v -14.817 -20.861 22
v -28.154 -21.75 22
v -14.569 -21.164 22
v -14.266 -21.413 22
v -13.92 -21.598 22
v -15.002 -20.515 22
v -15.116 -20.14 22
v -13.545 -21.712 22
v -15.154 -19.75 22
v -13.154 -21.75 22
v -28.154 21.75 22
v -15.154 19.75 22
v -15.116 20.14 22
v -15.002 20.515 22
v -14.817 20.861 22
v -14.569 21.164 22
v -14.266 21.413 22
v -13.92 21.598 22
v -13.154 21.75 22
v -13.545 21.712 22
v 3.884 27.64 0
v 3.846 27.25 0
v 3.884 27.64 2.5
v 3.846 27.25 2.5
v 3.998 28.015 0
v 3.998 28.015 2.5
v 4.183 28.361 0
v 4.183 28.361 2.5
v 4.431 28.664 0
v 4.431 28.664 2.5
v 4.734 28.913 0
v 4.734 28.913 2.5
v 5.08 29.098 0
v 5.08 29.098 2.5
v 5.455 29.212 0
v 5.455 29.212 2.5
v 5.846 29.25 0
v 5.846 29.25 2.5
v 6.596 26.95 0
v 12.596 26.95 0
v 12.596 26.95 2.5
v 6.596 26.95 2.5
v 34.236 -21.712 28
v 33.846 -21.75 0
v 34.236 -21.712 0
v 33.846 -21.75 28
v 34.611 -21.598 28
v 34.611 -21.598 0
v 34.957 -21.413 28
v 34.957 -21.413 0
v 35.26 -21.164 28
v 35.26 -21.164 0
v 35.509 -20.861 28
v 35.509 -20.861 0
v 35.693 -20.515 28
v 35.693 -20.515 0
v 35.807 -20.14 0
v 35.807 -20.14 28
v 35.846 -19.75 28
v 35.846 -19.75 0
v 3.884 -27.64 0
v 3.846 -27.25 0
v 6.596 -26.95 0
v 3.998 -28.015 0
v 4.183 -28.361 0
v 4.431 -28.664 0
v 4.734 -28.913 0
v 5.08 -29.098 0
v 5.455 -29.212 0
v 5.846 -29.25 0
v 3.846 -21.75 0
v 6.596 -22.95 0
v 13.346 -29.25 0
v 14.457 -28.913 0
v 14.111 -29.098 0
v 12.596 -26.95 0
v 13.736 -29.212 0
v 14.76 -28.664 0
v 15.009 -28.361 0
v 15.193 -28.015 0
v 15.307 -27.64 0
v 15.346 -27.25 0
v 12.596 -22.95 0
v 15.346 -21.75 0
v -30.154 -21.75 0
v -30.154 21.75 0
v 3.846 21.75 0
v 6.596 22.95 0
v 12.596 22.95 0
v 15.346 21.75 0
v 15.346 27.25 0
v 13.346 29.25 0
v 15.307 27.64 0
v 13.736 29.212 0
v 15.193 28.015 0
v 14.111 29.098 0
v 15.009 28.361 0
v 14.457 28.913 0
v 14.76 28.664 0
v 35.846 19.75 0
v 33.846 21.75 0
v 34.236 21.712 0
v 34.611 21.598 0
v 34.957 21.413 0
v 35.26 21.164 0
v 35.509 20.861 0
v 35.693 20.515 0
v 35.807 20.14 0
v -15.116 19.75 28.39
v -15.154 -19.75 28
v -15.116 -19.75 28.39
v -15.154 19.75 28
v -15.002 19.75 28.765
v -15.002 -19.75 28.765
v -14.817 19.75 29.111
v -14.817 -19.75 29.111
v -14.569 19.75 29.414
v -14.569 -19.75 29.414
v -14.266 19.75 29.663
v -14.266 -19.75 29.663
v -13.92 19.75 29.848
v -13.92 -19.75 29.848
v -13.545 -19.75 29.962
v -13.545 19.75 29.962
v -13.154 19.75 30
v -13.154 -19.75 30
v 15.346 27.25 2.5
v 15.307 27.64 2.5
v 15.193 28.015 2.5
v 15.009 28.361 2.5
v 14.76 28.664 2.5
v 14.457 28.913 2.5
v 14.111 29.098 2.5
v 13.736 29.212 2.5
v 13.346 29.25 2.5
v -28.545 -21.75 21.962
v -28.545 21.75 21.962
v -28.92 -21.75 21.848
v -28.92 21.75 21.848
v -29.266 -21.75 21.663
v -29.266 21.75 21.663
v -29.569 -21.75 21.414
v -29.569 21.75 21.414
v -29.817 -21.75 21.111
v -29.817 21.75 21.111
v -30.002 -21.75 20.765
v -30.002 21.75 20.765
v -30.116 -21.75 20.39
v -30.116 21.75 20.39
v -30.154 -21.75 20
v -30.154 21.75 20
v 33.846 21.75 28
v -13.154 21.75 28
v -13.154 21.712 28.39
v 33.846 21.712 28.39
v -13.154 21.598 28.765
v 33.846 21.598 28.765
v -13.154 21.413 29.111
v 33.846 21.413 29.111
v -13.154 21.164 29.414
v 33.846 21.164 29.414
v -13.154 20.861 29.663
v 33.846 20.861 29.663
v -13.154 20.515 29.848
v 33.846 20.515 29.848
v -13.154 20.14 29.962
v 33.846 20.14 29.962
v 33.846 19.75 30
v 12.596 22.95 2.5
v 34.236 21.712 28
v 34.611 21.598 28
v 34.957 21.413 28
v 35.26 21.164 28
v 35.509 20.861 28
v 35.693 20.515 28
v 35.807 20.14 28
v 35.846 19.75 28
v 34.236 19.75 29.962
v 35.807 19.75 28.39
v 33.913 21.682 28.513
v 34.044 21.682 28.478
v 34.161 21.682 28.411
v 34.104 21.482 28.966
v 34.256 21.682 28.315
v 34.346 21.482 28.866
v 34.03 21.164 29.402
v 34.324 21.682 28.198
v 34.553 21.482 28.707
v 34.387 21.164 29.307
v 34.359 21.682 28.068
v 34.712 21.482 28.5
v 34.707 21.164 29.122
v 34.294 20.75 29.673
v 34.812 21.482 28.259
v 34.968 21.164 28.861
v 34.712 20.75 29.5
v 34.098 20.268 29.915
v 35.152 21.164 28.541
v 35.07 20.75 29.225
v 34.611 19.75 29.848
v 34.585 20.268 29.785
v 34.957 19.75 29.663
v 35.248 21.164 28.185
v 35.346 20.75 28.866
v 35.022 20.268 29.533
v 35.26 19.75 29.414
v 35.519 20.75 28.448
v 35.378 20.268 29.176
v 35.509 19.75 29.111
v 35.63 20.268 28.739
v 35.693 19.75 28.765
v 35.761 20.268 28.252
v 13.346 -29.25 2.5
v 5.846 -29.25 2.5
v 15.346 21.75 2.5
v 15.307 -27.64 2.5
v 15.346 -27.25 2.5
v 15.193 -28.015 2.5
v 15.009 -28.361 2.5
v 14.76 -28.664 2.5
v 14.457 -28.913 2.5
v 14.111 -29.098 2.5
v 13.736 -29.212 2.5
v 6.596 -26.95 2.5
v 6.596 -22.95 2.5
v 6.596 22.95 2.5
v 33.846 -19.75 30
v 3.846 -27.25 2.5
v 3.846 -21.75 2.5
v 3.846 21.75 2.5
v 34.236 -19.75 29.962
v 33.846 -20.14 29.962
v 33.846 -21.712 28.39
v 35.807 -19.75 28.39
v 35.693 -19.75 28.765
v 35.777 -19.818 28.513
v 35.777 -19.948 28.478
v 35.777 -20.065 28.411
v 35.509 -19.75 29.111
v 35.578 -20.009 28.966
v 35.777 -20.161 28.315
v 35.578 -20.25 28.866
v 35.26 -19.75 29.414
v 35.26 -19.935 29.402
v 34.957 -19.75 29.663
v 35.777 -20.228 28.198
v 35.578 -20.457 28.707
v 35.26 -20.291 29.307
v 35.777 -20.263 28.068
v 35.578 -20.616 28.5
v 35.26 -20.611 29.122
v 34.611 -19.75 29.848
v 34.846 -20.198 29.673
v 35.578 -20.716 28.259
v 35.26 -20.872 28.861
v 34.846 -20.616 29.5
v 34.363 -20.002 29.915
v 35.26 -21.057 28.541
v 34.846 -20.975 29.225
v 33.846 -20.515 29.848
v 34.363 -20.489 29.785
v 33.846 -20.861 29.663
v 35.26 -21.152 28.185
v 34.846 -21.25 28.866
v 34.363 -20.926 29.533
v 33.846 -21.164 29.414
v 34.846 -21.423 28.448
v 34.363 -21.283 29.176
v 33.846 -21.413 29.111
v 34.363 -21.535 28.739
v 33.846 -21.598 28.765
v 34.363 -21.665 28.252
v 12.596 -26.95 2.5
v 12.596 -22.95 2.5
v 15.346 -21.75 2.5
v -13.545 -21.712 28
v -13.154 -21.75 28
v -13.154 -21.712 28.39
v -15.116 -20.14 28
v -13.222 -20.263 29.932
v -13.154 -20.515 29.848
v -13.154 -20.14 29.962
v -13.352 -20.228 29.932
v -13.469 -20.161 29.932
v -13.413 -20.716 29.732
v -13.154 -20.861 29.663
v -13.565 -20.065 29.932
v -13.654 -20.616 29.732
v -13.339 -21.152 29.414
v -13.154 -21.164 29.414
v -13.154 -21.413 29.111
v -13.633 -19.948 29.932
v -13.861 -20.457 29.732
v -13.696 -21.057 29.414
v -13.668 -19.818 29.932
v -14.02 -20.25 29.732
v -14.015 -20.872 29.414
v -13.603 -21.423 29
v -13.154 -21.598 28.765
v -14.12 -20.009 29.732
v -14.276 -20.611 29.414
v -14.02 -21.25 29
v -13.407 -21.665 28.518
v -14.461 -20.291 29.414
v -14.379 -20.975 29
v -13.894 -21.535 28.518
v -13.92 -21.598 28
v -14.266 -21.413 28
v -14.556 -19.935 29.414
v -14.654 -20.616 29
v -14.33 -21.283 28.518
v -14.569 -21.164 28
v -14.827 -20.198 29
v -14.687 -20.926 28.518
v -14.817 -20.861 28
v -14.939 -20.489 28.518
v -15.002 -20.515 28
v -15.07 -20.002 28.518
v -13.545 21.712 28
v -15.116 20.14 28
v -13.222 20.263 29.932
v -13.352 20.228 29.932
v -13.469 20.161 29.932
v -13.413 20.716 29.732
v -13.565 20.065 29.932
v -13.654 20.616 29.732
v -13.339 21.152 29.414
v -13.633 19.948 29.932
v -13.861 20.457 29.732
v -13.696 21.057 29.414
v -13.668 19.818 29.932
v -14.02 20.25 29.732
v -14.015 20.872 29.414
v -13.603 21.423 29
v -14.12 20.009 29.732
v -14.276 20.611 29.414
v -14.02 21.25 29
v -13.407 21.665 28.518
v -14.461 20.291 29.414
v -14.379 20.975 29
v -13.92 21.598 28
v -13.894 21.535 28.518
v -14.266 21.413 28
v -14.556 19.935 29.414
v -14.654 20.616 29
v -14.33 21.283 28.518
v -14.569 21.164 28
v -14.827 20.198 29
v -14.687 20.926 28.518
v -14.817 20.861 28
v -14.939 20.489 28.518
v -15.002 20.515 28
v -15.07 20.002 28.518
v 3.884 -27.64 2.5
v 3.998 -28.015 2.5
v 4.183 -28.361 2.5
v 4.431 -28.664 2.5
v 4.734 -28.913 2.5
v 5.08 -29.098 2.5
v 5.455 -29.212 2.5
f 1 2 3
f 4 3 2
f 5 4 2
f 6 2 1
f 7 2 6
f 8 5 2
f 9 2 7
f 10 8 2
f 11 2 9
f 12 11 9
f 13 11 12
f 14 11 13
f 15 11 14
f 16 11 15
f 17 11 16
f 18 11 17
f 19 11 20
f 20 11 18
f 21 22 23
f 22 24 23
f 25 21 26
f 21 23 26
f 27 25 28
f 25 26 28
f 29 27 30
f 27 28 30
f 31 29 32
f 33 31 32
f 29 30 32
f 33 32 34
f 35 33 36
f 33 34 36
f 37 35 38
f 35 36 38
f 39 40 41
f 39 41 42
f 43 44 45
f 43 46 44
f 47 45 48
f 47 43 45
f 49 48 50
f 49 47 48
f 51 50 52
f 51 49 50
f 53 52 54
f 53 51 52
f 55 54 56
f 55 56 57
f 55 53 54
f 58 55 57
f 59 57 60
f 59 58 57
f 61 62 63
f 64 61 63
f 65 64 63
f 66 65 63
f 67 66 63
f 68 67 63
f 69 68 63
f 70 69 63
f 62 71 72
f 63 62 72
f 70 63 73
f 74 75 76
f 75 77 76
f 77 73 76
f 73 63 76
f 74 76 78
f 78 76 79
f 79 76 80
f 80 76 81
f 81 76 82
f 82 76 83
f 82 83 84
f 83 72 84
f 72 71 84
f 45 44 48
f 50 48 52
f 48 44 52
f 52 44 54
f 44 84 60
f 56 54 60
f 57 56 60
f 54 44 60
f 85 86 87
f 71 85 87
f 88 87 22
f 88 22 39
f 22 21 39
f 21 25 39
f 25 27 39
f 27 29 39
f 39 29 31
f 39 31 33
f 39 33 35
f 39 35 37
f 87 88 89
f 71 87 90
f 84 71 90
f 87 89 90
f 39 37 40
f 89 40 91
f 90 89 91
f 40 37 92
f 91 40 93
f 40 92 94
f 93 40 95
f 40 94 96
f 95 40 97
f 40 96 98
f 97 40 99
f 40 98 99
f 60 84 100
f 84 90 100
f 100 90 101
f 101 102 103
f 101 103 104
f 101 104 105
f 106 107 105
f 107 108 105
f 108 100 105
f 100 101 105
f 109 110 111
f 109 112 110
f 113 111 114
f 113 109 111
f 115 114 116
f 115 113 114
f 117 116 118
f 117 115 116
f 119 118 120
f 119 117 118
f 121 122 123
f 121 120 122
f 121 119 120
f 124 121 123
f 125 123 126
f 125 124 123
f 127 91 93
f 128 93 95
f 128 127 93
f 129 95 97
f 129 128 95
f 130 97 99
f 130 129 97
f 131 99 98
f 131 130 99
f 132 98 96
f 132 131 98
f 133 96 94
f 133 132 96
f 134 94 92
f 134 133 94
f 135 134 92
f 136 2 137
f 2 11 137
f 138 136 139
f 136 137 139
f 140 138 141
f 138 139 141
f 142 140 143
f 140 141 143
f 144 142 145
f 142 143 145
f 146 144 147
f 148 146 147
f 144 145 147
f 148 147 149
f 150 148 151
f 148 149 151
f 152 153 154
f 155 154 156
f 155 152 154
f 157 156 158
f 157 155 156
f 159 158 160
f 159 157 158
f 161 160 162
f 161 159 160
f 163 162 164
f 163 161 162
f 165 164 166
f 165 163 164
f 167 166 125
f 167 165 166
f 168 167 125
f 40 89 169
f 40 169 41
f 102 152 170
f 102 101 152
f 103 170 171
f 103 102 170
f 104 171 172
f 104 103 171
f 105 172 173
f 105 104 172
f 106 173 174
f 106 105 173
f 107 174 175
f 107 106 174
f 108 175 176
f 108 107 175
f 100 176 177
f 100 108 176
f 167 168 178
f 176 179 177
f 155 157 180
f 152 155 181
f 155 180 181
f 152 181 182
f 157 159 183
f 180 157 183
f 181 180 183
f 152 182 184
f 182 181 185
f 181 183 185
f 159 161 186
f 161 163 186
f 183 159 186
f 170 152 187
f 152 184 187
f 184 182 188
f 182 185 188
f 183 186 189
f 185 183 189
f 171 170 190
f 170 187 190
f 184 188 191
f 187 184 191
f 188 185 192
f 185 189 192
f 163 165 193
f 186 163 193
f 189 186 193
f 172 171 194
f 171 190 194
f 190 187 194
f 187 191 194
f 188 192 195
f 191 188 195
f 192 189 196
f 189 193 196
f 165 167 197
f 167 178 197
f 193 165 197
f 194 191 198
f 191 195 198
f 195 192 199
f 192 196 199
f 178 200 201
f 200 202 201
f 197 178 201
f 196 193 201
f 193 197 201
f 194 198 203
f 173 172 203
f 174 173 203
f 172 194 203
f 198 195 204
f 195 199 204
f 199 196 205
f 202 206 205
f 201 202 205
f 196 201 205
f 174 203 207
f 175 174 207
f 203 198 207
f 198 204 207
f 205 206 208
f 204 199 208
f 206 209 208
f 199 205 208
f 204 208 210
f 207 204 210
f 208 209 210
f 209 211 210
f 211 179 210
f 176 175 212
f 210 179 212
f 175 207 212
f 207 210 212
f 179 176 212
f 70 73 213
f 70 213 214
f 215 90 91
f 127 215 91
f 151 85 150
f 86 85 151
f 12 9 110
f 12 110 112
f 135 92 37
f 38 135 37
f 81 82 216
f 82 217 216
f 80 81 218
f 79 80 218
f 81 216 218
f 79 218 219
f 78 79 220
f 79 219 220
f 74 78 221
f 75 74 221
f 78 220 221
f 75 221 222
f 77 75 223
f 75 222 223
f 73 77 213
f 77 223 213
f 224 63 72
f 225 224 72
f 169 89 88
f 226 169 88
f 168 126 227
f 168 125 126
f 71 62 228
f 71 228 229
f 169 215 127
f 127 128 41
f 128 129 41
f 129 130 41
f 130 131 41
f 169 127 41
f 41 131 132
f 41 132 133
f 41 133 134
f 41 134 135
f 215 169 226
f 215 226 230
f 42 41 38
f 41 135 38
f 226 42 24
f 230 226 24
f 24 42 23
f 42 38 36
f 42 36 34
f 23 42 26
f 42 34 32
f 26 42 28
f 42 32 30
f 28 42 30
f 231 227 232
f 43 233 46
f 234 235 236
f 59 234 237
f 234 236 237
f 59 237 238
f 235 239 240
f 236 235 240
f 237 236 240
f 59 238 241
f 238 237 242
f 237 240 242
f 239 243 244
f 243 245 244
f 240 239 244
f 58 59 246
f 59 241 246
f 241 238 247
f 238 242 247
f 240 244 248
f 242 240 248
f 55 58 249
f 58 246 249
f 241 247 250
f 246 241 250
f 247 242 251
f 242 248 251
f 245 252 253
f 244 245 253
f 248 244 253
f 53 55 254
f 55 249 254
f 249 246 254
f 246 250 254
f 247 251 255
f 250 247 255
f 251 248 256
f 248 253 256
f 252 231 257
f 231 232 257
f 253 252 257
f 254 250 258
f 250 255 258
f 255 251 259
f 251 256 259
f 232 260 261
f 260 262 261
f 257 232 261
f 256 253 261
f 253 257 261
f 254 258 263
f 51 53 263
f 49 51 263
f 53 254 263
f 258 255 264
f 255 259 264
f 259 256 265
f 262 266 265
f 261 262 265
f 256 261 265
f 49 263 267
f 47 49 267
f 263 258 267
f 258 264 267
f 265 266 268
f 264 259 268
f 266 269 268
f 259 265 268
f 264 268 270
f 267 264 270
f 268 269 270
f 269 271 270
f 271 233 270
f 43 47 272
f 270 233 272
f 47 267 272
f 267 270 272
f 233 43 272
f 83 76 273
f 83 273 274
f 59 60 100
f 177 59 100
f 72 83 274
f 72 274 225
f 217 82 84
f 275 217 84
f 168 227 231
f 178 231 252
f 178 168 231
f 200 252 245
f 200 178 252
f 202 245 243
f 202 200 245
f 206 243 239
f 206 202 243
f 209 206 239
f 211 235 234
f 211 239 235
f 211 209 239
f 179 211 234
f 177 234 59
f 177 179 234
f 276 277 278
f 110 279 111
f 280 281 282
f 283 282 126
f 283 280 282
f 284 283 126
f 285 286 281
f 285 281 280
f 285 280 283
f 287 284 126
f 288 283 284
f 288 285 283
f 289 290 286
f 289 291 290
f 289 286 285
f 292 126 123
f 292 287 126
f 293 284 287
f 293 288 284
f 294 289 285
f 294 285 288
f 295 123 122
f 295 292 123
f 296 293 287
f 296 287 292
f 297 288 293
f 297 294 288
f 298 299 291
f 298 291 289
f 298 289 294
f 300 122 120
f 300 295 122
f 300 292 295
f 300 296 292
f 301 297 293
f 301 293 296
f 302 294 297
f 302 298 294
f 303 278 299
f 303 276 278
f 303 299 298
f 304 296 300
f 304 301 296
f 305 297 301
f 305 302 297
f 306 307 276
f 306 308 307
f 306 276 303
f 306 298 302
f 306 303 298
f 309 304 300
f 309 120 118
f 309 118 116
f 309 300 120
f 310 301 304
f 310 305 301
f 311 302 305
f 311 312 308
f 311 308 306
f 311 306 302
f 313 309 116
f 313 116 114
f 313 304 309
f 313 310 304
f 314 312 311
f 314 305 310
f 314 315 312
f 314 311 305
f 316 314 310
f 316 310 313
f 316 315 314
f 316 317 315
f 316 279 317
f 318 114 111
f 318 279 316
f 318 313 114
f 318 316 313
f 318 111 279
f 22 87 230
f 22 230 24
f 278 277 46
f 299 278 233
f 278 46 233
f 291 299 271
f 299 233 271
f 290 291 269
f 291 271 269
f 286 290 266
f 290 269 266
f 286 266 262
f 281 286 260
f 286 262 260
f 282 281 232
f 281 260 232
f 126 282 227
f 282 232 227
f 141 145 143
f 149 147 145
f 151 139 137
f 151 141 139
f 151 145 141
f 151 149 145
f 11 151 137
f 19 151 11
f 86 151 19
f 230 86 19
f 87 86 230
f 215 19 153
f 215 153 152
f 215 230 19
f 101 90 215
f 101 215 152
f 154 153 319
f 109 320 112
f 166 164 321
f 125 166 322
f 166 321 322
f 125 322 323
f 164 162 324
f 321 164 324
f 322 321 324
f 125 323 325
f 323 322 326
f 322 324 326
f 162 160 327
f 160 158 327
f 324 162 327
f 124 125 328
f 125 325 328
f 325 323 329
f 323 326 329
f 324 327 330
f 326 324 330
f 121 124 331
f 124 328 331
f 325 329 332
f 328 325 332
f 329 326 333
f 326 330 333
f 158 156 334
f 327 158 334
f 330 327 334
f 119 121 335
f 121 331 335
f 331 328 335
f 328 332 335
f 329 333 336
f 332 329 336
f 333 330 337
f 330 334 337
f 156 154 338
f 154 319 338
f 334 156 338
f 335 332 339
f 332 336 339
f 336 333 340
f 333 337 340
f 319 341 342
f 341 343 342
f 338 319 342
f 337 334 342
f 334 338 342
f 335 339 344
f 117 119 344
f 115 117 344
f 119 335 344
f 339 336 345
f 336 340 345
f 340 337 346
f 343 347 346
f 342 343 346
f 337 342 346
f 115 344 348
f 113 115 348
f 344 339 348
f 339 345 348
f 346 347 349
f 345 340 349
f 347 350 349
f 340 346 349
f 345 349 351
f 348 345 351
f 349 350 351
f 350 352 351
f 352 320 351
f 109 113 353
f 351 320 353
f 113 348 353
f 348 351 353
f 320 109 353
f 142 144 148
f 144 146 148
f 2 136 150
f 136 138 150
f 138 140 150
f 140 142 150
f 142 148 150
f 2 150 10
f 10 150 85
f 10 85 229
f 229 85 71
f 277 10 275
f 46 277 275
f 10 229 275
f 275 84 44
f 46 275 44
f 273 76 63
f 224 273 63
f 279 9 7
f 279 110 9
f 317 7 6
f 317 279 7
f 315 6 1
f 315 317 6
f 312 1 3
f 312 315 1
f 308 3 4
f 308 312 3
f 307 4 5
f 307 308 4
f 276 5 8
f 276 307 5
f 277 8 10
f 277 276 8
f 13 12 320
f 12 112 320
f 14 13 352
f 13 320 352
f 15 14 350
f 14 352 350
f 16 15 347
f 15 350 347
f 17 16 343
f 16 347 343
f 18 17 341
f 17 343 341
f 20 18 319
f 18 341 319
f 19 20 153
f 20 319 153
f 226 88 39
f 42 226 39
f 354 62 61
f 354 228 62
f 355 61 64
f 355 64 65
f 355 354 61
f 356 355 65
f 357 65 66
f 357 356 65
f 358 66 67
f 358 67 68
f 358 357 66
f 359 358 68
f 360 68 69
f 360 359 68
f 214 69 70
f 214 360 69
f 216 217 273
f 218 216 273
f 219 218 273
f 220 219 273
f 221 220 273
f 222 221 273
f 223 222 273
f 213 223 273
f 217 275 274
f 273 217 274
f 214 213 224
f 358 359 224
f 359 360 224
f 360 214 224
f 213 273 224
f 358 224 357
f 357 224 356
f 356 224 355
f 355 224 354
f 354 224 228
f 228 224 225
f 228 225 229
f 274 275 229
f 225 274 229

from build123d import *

# Parameters (mm, degrees)
ESQUISSE1_W        = 66
ESQUISSE1_H        = 43.5
BOSS_EXTRU_1_DEPTH = 22
ESQUISSE2_W        = 51
ESQUISSE2_H        = 43.5
BOSS_EXTRU_2_DEPTH = 8
ESQUISSE3_W        = 11.5
ESQUISSE3_H        = 7.5
ESQUISSE3_W_2      = 6
ESQUISSE3_H_2      = 4
BOSS_EXTRU_3_DEPTH = 2.5
CONG_1_R           = 2


with BuildPart() as part:
    # Esquisse1 → Boss.-Extru.1 (new body)
    with BuildSketch(Plane.XY):
        with Locations((2.845632419, 0)):
            Rectangle(ESQUISSE1_W, ESQUISSE1_H)
    extrude(amount=BOSS_EXTRU_1_DEPTH)

    # Esquisse2 → Boss.-Extru.2 (add)
    with BuildSketch(Plane.XY.offset(22)):
        with Locations((10.345632419, 0)):
            Rectangle(ESQUISSE2_W, ESQUISSE2_H)
    extrude(amount=BOSS_EXTRU_2_DEPTH)

    # Esquisse3 → Boss.-Extru.3 (add)
    # profile 1 of 2: a face of its own
    with BuildSketch(Plane(origin=(0, 0, 0), x_dir=(-1, 0, 0), z_dir=(0, 0, -1))):
        with Locations((-9.595632419, 25.5)):
            Rectangle(ESQUISSE3_W, ESQUISSE3_H)
        with Locations((-9.595632419, 24.95)):
            Rectangle(ESQUISSE3_W_2, ESQUISSE3_H_2, mode=Mode.SUBTRACT)
    # profile 2 of 2: a face of its own
    with BuildSketch(Plane(origin=(0, 0, 0), x_dir=(-1, 0, 0), z_dir=(0, 0, -1))):
        with Locations((-9.595632419, -25.5)):
            Rectangle(ESQUISSE3_W, ESQUISSE3_H)
        with Locations((-9.595632419, -24.95)):
            Rectangle(ESQUISSE3_W_2, ESQUISSE3_H_2, mode=Mode.SUBTRACT)
    extrude(amount=-BOSS_EXTRU_3_DEPTH)

    # Congé1
    cong_1_edges = [part.edges().sort_by_distance(p)[0] for p in [
        (-15.154367581, 21.75, 26),
        (-15.154367581, -21.75, 26),
        (10.345632419, -21.75, 30),
        (35.845632419, 0, 30),
        (10.345632419, 21.75, 30),
        (-15.154367581, 0, 30),
        (15.345632419, 29.25, 1.25),
        (3.845632419, 29.25, 1.25),
        (-30.154367581, 0, 22),
        (15.345632419, -29.25, 1.25),
        (3.845632419, -29.25, 1.25),
        (35.845632419, 21.75, 15),
        (35.845632419, -21.75, 15),
    ]]
    fillet(cong_1_edges, radius=CONG_1_R)


solid = part.part
